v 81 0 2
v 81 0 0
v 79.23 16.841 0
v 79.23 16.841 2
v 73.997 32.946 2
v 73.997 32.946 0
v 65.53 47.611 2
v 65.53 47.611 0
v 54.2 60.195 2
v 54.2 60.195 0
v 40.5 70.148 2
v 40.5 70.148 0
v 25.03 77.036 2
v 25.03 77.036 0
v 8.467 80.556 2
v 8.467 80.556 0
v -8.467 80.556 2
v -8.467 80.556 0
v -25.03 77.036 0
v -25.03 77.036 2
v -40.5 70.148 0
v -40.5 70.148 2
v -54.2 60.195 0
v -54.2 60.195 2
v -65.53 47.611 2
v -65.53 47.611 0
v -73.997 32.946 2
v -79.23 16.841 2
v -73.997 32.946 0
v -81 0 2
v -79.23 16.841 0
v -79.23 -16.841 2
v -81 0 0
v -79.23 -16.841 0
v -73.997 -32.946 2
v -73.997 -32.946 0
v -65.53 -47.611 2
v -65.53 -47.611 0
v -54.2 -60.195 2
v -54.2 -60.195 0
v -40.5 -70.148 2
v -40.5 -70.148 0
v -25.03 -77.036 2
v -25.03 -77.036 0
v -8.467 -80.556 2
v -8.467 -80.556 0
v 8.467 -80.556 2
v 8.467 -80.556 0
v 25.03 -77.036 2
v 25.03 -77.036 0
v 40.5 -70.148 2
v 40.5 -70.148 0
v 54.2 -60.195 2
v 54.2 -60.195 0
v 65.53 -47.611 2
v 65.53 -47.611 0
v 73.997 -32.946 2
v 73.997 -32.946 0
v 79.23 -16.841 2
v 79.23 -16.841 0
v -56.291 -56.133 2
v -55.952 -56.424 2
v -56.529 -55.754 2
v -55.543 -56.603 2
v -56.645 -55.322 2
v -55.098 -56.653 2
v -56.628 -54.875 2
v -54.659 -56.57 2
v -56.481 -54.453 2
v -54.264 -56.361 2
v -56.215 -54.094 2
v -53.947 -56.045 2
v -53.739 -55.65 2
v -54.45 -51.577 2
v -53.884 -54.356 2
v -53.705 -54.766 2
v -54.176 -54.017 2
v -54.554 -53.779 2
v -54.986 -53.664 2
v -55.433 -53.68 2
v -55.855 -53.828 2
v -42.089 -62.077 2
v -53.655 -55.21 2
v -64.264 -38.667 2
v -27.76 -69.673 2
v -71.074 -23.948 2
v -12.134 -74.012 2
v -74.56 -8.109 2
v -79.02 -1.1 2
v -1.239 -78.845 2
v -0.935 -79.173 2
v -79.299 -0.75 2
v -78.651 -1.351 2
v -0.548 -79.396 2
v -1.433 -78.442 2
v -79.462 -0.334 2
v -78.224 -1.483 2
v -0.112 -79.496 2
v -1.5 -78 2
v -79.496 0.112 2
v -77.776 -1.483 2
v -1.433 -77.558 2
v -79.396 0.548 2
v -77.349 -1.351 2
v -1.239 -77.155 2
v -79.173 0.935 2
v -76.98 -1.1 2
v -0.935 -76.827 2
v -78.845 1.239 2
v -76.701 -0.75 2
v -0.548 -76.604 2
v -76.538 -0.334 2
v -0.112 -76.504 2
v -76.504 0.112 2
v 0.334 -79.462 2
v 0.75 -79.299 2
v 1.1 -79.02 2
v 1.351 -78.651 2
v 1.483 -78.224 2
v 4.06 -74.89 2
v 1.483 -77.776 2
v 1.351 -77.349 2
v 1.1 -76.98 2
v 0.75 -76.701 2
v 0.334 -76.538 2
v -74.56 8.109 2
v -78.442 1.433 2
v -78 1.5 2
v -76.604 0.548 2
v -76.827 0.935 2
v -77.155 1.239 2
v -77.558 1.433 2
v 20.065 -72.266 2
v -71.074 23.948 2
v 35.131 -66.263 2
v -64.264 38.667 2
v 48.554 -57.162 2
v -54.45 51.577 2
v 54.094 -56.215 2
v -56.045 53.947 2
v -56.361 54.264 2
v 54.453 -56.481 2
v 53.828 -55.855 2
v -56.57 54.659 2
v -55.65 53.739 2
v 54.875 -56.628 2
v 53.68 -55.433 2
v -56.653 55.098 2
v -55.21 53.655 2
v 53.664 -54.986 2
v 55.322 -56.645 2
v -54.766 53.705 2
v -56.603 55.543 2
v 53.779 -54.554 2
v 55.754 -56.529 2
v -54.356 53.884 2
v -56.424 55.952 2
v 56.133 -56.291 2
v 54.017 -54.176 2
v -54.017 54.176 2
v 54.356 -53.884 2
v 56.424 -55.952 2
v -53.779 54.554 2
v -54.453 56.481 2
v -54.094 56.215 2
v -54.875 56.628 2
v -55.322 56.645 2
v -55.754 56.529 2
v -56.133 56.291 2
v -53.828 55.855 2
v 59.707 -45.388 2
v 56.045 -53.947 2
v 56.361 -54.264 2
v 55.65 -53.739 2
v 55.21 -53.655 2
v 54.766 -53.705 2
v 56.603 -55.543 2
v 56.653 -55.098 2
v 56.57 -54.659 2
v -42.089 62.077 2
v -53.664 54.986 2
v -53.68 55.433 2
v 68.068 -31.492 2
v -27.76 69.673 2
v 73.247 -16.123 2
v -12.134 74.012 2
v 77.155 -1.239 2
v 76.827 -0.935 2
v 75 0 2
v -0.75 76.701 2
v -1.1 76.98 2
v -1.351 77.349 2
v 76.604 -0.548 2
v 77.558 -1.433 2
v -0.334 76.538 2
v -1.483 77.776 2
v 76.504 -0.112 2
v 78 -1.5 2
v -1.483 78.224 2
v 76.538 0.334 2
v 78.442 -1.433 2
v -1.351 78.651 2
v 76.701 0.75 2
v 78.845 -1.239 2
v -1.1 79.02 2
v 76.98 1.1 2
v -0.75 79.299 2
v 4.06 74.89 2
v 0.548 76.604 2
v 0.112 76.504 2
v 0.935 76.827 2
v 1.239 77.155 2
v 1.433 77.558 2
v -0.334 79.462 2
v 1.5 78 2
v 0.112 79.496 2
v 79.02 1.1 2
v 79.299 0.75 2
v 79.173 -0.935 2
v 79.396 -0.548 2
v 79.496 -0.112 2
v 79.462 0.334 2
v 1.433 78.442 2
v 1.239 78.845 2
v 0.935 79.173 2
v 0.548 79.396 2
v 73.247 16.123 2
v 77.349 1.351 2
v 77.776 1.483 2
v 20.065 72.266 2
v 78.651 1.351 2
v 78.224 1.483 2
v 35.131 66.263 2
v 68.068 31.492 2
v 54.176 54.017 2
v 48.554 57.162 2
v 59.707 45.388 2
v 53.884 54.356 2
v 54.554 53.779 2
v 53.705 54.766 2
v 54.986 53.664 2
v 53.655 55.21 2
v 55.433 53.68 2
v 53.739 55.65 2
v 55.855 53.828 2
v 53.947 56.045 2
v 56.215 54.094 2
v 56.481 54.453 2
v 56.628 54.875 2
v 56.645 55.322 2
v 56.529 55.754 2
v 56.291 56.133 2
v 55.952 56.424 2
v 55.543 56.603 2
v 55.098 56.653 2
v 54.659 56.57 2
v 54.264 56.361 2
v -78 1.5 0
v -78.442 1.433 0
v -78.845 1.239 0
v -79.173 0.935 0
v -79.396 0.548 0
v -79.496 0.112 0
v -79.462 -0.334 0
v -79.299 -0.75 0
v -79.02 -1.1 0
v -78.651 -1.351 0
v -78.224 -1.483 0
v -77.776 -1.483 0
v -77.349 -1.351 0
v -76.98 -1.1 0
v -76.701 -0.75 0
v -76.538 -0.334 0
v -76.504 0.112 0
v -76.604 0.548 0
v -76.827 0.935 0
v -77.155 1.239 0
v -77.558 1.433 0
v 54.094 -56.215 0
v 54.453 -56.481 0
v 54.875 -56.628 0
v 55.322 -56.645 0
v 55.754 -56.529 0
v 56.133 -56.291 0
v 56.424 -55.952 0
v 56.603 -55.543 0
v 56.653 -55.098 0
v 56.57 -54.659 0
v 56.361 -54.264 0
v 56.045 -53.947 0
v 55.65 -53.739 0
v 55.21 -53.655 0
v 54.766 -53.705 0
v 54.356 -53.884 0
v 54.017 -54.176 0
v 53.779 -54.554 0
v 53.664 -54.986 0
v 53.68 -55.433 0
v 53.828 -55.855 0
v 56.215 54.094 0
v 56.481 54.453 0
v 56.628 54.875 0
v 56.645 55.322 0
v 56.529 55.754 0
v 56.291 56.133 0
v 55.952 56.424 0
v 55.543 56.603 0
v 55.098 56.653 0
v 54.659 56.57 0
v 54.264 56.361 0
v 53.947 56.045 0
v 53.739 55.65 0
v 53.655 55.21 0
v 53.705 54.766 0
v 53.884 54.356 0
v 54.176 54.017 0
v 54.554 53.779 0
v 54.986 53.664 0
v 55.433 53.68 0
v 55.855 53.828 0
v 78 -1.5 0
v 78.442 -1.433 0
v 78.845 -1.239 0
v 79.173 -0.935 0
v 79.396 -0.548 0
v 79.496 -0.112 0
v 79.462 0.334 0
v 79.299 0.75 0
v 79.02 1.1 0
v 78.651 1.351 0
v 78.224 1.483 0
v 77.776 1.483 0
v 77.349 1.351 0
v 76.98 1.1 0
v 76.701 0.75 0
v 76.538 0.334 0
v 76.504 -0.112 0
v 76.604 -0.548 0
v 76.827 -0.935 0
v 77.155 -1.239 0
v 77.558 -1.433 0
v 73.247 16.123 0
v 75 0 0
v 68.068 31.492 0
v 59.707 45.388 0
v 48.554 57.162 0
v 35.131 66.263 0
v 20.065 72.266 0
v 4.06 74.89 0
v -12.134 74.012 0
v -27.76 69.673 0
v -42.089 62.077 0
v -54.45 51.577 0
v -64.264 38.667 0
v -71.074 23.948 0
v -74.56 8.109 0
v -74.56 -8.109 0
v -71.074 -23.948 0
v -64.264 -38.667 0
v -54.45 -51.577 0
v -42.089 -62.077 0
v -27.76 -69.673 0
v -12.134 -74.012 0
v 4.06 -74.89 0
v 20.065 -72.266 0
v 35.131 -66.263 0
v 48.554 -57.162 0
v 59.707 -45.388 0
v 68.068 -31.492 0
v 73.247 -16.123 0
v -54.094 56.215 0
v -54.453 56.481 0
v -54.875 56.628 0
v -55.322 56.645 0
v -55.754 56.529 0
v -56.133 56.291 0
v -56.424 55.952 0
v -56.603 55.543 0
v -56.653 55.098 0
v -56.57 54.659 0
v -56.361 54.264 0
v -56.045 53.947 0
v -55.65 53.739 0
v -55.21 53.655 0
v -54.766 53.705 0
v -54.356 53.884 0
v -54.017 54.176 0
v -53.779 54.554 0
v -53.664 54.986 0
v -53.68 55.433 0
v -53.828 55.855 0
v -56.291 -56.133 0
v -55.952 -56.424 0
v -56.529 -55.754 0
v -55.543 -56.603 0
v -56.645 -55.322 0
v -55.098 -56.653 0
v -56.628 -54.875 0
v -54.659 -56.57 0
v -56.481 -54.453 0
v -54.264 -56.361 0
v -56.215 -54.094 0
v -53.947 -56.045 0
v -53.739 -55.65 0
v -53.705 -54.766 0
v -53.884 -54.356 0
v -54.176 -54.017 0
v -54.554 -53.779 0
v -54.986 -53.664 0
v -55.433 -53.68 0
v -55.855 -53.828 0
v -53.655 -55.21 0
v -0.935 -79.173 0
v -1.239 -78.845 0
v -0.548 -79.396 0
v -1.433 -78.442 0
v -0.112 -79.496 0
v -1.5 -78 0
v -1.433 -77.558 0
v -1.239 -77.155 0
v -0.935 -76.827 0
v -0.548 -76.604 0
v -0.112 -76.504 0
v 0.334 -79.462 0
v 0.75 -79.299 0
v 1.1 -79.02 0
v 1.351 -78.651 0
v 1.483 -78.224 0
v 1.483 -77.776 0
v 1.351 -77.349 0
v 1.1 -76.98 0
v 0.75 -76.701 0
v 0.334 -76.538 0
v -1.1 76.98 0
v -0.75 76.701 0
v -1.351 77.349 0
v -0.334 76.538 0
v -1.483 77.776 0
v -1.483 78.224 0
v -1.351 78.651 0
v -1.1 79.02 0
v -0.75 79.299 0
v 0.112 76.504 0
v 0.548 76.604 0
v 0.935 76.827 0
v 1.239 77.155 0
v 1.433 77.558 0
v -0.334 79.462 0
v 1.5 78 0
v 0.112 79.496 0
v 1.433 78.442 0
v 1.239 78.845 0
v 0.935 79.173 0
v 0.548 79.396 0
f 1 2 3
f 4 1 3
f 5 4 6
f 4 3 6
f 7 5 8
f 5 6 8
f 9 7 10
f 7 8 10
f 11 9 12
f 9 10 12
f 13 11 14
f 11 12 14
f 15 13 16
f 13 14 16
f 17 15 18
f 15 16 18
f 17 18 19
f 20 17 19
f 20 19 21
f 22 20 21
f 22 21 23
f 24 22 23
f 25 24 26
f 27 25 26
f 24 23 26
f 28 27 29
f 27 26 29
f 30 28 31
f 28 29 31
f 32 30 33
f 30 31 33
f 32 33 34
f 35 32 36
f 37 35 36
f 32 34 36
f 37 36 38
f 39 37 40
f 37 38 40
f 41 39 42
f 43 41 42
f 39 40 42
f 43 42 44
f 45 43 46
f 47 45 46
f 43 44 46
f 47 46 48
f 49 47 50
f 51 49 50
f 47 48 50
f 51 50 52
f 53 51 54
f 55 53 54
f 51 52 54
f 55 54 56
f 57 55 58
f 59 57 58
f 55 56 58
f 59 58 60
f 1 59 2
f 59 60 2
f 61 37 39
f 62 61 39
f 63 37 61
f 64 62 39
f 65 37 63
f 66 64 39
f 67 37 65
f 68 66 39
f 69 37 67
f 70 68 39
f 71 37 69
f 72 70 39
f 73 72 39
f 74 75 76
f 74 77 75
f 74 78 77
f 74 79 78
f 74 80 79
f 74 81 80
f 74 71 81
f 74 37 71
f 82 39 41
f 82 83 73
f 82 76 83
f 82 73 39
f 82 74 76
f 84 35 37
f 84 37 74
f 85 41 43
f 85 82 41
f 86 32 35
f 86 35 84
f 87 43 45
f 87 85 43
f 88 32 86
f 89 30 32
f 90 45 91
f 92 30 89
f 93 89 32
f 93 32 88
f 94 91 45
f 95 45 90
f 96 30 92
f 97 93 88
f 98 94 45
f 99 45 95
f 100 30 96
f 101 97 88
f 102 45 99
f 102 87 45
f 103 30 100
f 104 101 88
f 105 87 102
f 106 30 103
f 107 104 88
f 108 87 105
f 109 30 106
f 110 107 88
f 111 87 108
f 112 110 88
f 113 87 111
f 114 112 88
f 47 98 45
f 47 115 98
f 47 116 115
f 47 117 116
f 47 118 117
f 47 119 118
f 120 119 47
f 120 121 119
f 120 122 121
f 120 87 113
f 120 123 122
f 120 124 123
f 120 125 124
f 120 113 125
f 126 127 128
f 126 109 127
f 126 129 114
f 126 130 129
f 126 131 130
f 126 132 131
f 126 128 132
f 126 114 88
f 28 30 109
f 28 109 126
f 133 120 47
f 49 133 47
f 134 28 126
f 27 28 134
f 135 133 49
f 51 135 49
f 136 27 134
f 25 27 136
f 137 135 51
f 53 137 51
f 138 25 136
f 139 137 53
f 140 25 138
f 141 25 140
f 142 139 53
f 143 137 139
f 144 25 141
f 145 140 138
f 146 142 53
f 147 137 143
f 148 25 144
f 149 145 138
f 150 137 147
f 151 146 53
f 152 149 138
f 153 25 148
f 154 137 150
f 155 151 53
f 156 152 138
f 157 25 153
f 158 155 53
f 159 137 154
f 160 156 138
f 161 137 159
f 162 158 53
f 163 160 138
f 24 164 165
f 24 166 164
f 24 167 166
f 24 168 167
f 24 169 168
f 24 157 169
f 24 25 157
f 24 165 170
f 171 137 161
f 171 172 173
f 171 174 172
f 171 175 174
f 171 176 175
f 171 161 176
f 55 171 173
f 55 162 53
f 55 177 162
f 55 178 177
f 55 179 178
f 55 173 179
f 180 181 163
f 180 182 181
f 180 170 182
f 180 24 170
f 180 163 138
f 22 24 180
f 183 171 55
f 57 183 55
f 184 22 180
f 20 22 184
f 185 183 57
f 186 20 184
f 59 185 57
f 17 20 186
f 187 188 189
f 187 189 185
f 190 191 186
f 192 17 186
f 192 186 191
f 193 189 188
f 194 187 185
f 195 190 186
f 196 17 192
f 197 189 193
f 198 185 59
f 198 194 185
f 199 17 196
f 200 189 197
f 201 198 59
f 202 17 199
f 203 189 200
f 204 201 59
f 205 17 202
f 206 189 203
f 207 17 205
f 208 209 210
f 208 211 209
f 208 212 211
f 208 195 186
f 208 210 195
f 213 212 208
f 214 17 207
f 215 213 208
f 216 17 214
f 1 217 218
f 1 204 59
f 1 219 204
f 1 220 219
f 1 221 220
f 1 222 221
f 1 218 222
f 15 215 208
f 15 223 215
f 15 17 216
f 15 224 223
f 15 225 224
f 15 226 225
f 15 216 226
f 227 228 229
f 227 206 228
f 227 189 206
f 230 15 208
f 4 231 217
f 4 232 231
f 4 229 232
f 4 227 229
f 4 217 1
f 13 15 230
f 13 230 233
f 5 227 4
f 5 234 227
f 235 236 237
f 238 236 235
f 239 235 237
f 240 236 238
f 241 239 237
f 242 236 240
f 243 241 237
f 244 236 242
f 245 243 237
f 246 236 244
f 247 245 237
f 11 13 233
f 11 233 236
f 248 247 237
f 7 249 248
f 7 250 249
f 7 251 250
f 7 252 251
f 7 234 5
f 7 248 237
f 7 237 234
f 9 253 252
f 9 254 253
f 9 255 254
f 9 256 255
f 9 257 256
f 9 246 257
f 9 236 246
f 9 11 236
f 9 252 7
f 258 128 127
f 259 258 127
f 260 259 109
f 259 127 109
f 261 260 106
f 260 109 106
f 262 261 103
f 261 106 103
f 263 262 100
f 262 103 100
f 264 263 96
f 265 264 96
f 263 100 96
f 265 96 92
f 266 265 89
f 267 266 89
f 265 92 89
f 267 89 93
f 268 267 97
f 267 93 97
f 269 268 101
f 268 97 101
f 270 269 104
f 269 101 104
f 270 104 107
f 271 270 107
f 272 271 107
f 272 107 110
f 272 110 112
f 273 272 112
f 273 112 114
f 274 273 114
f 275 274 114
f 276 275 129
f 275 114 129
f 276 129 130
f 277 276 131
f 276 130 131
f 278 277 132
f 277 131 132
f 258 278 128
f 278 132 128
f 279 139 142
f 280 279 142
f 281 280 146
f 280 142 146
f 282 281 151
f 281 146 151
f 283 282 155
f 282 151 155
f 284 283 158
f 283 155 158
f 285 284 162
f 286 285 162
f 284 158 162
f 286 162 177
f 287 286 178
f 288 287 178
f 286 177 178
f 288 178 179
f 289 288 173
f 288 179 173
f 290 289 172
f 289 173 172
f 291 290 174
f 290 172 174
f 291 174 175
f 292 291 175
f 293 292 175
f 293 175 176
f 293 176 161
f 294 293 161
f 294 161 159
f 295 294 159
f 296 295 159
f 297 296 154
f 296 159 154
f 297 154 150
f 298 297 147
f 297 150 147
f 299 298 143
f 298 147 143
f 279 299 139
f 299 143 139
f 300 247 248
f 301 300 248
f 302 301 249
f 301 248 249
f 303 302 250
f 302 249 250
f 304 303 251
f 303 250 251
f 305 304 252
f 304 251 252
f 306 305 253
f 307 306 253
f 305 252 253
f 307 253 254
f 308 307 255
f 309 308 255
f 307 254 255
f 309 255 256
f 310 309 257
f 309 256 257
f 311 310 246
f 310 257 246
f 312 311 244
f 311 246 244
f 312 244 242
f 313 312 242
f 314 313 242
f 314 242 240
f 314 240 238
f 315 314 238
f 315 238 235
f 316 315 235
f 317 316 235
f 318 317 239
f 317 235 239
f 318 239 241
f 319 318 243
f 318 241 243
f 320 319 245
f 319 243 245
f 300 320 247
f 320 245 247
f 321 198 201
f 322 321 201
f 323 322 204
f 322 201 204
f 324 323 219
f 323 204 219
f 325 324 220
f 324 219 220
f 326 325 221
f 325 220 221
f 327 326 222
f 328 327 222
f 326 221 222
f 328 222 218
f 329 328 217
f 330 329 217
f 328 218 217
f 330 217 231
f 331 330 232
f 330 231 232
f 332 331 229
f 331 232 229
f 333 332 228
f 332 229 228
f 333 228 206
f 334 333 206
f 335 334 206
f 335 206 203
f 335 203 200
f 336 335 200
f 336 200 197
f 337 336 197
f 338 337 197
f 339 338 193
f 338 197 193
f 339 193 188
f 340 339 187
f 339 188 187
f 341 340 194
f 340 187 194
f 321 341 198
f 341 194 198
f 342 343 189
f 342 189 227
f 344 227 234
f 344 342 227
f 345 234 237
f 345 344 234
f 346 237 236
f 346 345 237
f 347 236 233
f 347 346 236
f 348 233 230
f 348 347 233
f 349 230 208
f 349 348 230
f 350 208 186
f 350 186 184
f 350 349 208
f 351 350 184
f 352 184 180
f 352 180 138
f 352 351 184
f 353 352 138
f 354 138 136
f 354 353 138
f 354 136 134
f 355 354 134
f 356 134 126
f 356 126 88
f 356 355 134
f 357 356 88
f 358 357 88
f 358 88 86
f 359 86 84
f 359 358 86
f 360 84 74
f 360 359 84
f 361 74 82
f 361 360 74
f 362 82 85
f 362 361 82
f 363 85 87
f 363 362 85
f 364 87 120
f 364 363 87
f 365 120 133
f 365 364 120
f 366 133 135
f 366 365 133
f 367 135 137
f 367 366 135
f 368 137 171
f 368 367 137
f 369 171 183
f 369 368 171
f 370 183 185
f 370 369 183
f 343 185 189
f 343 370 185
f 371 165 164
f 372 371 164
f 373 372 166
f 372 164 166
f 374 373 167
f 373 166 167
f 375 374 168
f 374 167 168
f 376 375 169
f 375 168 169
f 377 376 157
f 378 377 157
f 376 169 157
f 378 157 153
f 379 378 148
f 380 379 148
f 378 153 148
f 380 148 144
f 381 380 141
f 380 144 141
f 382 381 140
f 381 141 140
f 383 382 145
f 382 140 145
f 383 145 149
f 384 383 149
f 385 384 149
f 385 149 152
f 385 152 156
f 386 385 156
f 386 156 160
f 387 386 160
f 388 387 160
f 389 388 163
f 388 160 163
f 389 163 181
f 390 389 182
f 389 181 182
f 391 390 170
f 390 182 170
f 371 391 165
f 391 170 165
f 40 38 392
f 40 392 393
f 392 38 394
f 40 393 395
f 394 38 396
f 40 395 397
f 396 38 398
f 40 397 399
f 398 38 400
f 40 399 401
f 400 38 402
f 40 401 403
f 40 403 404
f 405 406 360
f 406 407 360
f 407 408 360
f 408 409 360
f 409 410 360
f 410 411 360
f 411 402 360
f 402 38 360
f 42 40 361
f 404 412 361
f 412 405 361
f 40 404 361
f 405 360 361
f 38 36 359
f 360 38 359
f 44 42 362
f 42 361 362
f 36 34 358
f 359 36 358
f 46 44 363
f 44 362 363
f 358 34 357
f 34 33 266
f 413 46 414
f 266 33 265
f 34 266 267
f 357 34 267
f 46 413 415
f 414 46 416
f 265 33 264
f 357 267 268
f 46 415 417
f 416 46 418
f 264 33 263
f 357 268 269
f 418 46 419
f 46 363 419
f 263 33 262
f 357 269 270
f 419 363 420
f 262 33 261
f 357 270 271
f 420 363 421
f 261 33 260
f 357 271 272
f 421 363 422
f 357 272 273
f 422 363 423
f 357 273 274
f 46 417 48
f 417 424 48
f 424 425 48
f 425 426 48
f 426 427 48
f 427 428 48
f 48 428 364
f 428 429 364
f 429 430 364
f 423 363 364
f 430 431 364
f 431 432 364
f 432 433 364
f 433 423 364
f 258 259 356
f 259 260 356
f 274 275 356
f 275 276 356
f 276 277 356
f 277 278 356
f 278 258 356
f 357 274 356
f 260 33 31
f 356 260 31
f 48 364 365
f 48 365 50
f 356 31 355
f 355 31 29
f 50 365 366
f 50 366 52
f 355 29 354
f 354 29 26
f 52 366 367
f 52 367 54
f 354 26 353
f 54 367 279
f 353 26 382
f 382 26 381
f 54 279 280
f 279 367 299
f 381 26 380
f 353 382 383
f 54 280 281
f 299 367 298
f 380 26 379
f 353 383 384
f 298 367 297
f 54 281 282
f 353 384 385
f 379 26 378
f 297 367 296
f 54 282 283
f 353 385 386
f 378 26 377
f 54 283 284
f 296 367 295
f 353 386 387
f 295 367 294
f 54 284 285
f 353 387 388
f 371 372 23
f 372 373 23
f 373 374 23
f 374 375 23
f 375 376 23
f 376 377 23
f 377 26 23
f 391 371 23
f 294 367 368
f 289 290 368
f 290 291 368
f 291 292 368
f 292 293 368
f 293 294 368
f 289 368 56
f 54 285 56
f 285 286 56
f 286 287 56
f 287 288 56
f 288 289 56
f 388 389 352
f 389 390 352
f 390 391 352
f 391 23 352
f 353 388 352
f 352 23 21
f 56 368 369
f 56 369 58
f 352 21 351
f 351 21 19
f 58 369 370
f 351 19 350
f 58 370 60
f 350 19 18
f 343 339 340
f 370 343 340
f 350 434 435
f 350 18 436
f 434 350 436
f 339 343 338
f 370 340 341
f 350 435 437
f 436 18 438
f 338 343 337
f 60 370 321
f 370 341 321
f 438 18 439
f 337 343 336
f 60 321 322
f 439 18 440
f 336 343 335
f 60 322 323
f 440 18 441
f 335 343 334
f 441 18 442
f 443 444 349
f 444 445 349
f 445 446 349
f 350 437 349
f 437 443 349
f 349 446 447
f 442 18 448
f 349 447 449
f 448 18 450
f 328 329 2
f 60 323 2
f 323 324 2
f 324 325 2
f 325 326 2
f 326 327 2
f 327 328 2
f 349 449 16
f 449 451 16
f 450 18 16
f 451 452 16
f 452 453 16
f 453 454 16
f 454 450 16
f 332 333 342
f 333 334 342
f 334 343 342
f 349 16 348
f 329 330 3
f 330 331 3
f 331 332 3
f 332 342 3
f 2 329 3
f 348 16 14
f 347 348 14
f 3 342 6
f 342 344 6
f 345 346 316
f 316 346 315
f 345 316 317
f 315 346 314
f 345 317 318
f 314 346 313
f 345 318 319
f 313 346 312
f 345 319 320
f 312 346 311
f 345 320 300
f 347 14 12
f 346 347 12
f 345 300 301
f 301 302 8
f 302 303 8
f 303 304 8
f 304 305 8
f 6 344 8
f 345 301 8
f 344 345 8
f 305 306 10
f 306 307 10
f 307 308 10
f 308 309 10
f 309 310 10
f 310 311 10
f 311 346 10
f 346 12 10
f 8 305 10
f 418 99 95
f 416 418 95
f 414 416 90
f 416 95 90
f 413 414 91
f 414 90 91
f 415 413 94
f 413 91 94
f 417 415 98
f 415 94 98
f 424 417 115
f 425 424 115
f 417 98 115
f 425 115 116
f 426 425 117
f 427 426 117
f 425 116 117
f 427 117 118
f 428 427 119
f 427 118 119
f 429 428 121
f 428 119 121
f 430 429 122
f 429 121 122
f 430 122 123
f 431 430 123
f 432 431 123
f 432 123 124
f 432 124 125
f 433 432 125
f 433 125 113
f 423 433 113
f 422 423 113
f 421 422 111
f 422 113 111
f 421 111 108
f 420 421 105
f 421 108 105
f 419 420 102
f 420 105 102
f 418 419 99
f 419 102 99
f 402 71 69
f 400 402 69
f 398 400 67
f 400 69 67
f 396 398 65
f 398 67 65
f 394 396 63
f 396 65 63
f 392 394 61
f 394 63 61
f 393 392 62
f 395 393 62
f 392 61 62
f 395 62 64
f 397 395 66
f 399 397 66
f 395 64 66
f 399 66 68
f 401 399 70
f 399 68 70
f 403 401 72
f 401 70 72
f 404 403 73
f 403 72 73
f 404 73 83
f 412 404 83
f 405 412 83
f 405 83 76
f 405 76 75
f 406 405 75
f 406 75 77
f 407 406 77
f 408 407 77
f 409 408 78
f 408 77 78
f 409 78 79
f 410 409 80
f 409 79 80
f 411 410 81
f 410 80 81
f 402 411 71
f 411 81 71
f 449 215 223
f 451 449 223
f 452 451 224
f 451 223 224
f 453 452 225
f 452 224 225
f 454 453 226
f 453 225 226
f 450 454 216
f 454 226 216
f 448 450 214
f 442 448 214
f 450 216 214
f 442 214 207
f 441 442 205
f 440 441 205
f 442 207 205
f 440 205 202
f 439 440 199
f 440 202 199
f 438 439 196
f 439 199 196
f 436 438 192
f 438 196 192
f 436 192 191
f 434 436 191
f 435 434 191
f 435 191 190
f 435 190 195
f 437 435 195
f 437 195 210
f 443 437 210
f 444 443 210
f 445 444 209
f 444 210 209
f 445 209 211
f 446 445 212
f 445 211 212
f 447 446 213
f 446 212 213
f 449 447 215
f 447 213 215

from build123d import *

# Parameters (mm, degrees)
SZKIC1_R                    = 81
SZKIC1_R_2                  = 75
DODANIE_WYCI_GNI_CIE1_DEPTH = 2
SZKIC2_R                    = 1.5
WYTNIJ_WYCI_GNI_CIE1_DEPTH  = 2
SZYK_KO_OWY1_COUNT          = 8


with BuildPart() as part:
    # Szkic1 → Dodanie-wyciągnięcie1 (new body)
    with BuildSketch(Plane.XY):
        Circle(SZKIC1_R)
        Circle(SZKIC1_R_2, mode=Mode.SUBTRACT)
    extrude(amount=DODANIE_WYCI_GNI_CIE1_DEPTH)

    # Szkic2 → Wytnij-wyciągnięcie1 (cut)
    with BuildSketch(Plane.XY.offset(2)):
        with Locations((0, 78)):
            Circle(SZKIC2_R)
    wytnij_wyci_gni_cie1 = extrude(amount=-WYTNIJ_WYCI_GNI_CIE1_DEPTH, mode=Mode.SUBTRACT)

    # Szyk kołowy1: Wytnij-wyciągnięcie1 ×8 about axis
    szyk_ko_owy1_axis = Axis((0, 0, 0), (0, 0, 1))
    for i in range(1, SZYK_KO_OWY1_COUNT):
        add(wytnij_wyci_gni_cie1.rotate(szyk_ko_owy1_axis, i * 360 / SZYK_KO_OWY1_COUNT), mode=Mode.SUBTRACT)


solid = part.part
